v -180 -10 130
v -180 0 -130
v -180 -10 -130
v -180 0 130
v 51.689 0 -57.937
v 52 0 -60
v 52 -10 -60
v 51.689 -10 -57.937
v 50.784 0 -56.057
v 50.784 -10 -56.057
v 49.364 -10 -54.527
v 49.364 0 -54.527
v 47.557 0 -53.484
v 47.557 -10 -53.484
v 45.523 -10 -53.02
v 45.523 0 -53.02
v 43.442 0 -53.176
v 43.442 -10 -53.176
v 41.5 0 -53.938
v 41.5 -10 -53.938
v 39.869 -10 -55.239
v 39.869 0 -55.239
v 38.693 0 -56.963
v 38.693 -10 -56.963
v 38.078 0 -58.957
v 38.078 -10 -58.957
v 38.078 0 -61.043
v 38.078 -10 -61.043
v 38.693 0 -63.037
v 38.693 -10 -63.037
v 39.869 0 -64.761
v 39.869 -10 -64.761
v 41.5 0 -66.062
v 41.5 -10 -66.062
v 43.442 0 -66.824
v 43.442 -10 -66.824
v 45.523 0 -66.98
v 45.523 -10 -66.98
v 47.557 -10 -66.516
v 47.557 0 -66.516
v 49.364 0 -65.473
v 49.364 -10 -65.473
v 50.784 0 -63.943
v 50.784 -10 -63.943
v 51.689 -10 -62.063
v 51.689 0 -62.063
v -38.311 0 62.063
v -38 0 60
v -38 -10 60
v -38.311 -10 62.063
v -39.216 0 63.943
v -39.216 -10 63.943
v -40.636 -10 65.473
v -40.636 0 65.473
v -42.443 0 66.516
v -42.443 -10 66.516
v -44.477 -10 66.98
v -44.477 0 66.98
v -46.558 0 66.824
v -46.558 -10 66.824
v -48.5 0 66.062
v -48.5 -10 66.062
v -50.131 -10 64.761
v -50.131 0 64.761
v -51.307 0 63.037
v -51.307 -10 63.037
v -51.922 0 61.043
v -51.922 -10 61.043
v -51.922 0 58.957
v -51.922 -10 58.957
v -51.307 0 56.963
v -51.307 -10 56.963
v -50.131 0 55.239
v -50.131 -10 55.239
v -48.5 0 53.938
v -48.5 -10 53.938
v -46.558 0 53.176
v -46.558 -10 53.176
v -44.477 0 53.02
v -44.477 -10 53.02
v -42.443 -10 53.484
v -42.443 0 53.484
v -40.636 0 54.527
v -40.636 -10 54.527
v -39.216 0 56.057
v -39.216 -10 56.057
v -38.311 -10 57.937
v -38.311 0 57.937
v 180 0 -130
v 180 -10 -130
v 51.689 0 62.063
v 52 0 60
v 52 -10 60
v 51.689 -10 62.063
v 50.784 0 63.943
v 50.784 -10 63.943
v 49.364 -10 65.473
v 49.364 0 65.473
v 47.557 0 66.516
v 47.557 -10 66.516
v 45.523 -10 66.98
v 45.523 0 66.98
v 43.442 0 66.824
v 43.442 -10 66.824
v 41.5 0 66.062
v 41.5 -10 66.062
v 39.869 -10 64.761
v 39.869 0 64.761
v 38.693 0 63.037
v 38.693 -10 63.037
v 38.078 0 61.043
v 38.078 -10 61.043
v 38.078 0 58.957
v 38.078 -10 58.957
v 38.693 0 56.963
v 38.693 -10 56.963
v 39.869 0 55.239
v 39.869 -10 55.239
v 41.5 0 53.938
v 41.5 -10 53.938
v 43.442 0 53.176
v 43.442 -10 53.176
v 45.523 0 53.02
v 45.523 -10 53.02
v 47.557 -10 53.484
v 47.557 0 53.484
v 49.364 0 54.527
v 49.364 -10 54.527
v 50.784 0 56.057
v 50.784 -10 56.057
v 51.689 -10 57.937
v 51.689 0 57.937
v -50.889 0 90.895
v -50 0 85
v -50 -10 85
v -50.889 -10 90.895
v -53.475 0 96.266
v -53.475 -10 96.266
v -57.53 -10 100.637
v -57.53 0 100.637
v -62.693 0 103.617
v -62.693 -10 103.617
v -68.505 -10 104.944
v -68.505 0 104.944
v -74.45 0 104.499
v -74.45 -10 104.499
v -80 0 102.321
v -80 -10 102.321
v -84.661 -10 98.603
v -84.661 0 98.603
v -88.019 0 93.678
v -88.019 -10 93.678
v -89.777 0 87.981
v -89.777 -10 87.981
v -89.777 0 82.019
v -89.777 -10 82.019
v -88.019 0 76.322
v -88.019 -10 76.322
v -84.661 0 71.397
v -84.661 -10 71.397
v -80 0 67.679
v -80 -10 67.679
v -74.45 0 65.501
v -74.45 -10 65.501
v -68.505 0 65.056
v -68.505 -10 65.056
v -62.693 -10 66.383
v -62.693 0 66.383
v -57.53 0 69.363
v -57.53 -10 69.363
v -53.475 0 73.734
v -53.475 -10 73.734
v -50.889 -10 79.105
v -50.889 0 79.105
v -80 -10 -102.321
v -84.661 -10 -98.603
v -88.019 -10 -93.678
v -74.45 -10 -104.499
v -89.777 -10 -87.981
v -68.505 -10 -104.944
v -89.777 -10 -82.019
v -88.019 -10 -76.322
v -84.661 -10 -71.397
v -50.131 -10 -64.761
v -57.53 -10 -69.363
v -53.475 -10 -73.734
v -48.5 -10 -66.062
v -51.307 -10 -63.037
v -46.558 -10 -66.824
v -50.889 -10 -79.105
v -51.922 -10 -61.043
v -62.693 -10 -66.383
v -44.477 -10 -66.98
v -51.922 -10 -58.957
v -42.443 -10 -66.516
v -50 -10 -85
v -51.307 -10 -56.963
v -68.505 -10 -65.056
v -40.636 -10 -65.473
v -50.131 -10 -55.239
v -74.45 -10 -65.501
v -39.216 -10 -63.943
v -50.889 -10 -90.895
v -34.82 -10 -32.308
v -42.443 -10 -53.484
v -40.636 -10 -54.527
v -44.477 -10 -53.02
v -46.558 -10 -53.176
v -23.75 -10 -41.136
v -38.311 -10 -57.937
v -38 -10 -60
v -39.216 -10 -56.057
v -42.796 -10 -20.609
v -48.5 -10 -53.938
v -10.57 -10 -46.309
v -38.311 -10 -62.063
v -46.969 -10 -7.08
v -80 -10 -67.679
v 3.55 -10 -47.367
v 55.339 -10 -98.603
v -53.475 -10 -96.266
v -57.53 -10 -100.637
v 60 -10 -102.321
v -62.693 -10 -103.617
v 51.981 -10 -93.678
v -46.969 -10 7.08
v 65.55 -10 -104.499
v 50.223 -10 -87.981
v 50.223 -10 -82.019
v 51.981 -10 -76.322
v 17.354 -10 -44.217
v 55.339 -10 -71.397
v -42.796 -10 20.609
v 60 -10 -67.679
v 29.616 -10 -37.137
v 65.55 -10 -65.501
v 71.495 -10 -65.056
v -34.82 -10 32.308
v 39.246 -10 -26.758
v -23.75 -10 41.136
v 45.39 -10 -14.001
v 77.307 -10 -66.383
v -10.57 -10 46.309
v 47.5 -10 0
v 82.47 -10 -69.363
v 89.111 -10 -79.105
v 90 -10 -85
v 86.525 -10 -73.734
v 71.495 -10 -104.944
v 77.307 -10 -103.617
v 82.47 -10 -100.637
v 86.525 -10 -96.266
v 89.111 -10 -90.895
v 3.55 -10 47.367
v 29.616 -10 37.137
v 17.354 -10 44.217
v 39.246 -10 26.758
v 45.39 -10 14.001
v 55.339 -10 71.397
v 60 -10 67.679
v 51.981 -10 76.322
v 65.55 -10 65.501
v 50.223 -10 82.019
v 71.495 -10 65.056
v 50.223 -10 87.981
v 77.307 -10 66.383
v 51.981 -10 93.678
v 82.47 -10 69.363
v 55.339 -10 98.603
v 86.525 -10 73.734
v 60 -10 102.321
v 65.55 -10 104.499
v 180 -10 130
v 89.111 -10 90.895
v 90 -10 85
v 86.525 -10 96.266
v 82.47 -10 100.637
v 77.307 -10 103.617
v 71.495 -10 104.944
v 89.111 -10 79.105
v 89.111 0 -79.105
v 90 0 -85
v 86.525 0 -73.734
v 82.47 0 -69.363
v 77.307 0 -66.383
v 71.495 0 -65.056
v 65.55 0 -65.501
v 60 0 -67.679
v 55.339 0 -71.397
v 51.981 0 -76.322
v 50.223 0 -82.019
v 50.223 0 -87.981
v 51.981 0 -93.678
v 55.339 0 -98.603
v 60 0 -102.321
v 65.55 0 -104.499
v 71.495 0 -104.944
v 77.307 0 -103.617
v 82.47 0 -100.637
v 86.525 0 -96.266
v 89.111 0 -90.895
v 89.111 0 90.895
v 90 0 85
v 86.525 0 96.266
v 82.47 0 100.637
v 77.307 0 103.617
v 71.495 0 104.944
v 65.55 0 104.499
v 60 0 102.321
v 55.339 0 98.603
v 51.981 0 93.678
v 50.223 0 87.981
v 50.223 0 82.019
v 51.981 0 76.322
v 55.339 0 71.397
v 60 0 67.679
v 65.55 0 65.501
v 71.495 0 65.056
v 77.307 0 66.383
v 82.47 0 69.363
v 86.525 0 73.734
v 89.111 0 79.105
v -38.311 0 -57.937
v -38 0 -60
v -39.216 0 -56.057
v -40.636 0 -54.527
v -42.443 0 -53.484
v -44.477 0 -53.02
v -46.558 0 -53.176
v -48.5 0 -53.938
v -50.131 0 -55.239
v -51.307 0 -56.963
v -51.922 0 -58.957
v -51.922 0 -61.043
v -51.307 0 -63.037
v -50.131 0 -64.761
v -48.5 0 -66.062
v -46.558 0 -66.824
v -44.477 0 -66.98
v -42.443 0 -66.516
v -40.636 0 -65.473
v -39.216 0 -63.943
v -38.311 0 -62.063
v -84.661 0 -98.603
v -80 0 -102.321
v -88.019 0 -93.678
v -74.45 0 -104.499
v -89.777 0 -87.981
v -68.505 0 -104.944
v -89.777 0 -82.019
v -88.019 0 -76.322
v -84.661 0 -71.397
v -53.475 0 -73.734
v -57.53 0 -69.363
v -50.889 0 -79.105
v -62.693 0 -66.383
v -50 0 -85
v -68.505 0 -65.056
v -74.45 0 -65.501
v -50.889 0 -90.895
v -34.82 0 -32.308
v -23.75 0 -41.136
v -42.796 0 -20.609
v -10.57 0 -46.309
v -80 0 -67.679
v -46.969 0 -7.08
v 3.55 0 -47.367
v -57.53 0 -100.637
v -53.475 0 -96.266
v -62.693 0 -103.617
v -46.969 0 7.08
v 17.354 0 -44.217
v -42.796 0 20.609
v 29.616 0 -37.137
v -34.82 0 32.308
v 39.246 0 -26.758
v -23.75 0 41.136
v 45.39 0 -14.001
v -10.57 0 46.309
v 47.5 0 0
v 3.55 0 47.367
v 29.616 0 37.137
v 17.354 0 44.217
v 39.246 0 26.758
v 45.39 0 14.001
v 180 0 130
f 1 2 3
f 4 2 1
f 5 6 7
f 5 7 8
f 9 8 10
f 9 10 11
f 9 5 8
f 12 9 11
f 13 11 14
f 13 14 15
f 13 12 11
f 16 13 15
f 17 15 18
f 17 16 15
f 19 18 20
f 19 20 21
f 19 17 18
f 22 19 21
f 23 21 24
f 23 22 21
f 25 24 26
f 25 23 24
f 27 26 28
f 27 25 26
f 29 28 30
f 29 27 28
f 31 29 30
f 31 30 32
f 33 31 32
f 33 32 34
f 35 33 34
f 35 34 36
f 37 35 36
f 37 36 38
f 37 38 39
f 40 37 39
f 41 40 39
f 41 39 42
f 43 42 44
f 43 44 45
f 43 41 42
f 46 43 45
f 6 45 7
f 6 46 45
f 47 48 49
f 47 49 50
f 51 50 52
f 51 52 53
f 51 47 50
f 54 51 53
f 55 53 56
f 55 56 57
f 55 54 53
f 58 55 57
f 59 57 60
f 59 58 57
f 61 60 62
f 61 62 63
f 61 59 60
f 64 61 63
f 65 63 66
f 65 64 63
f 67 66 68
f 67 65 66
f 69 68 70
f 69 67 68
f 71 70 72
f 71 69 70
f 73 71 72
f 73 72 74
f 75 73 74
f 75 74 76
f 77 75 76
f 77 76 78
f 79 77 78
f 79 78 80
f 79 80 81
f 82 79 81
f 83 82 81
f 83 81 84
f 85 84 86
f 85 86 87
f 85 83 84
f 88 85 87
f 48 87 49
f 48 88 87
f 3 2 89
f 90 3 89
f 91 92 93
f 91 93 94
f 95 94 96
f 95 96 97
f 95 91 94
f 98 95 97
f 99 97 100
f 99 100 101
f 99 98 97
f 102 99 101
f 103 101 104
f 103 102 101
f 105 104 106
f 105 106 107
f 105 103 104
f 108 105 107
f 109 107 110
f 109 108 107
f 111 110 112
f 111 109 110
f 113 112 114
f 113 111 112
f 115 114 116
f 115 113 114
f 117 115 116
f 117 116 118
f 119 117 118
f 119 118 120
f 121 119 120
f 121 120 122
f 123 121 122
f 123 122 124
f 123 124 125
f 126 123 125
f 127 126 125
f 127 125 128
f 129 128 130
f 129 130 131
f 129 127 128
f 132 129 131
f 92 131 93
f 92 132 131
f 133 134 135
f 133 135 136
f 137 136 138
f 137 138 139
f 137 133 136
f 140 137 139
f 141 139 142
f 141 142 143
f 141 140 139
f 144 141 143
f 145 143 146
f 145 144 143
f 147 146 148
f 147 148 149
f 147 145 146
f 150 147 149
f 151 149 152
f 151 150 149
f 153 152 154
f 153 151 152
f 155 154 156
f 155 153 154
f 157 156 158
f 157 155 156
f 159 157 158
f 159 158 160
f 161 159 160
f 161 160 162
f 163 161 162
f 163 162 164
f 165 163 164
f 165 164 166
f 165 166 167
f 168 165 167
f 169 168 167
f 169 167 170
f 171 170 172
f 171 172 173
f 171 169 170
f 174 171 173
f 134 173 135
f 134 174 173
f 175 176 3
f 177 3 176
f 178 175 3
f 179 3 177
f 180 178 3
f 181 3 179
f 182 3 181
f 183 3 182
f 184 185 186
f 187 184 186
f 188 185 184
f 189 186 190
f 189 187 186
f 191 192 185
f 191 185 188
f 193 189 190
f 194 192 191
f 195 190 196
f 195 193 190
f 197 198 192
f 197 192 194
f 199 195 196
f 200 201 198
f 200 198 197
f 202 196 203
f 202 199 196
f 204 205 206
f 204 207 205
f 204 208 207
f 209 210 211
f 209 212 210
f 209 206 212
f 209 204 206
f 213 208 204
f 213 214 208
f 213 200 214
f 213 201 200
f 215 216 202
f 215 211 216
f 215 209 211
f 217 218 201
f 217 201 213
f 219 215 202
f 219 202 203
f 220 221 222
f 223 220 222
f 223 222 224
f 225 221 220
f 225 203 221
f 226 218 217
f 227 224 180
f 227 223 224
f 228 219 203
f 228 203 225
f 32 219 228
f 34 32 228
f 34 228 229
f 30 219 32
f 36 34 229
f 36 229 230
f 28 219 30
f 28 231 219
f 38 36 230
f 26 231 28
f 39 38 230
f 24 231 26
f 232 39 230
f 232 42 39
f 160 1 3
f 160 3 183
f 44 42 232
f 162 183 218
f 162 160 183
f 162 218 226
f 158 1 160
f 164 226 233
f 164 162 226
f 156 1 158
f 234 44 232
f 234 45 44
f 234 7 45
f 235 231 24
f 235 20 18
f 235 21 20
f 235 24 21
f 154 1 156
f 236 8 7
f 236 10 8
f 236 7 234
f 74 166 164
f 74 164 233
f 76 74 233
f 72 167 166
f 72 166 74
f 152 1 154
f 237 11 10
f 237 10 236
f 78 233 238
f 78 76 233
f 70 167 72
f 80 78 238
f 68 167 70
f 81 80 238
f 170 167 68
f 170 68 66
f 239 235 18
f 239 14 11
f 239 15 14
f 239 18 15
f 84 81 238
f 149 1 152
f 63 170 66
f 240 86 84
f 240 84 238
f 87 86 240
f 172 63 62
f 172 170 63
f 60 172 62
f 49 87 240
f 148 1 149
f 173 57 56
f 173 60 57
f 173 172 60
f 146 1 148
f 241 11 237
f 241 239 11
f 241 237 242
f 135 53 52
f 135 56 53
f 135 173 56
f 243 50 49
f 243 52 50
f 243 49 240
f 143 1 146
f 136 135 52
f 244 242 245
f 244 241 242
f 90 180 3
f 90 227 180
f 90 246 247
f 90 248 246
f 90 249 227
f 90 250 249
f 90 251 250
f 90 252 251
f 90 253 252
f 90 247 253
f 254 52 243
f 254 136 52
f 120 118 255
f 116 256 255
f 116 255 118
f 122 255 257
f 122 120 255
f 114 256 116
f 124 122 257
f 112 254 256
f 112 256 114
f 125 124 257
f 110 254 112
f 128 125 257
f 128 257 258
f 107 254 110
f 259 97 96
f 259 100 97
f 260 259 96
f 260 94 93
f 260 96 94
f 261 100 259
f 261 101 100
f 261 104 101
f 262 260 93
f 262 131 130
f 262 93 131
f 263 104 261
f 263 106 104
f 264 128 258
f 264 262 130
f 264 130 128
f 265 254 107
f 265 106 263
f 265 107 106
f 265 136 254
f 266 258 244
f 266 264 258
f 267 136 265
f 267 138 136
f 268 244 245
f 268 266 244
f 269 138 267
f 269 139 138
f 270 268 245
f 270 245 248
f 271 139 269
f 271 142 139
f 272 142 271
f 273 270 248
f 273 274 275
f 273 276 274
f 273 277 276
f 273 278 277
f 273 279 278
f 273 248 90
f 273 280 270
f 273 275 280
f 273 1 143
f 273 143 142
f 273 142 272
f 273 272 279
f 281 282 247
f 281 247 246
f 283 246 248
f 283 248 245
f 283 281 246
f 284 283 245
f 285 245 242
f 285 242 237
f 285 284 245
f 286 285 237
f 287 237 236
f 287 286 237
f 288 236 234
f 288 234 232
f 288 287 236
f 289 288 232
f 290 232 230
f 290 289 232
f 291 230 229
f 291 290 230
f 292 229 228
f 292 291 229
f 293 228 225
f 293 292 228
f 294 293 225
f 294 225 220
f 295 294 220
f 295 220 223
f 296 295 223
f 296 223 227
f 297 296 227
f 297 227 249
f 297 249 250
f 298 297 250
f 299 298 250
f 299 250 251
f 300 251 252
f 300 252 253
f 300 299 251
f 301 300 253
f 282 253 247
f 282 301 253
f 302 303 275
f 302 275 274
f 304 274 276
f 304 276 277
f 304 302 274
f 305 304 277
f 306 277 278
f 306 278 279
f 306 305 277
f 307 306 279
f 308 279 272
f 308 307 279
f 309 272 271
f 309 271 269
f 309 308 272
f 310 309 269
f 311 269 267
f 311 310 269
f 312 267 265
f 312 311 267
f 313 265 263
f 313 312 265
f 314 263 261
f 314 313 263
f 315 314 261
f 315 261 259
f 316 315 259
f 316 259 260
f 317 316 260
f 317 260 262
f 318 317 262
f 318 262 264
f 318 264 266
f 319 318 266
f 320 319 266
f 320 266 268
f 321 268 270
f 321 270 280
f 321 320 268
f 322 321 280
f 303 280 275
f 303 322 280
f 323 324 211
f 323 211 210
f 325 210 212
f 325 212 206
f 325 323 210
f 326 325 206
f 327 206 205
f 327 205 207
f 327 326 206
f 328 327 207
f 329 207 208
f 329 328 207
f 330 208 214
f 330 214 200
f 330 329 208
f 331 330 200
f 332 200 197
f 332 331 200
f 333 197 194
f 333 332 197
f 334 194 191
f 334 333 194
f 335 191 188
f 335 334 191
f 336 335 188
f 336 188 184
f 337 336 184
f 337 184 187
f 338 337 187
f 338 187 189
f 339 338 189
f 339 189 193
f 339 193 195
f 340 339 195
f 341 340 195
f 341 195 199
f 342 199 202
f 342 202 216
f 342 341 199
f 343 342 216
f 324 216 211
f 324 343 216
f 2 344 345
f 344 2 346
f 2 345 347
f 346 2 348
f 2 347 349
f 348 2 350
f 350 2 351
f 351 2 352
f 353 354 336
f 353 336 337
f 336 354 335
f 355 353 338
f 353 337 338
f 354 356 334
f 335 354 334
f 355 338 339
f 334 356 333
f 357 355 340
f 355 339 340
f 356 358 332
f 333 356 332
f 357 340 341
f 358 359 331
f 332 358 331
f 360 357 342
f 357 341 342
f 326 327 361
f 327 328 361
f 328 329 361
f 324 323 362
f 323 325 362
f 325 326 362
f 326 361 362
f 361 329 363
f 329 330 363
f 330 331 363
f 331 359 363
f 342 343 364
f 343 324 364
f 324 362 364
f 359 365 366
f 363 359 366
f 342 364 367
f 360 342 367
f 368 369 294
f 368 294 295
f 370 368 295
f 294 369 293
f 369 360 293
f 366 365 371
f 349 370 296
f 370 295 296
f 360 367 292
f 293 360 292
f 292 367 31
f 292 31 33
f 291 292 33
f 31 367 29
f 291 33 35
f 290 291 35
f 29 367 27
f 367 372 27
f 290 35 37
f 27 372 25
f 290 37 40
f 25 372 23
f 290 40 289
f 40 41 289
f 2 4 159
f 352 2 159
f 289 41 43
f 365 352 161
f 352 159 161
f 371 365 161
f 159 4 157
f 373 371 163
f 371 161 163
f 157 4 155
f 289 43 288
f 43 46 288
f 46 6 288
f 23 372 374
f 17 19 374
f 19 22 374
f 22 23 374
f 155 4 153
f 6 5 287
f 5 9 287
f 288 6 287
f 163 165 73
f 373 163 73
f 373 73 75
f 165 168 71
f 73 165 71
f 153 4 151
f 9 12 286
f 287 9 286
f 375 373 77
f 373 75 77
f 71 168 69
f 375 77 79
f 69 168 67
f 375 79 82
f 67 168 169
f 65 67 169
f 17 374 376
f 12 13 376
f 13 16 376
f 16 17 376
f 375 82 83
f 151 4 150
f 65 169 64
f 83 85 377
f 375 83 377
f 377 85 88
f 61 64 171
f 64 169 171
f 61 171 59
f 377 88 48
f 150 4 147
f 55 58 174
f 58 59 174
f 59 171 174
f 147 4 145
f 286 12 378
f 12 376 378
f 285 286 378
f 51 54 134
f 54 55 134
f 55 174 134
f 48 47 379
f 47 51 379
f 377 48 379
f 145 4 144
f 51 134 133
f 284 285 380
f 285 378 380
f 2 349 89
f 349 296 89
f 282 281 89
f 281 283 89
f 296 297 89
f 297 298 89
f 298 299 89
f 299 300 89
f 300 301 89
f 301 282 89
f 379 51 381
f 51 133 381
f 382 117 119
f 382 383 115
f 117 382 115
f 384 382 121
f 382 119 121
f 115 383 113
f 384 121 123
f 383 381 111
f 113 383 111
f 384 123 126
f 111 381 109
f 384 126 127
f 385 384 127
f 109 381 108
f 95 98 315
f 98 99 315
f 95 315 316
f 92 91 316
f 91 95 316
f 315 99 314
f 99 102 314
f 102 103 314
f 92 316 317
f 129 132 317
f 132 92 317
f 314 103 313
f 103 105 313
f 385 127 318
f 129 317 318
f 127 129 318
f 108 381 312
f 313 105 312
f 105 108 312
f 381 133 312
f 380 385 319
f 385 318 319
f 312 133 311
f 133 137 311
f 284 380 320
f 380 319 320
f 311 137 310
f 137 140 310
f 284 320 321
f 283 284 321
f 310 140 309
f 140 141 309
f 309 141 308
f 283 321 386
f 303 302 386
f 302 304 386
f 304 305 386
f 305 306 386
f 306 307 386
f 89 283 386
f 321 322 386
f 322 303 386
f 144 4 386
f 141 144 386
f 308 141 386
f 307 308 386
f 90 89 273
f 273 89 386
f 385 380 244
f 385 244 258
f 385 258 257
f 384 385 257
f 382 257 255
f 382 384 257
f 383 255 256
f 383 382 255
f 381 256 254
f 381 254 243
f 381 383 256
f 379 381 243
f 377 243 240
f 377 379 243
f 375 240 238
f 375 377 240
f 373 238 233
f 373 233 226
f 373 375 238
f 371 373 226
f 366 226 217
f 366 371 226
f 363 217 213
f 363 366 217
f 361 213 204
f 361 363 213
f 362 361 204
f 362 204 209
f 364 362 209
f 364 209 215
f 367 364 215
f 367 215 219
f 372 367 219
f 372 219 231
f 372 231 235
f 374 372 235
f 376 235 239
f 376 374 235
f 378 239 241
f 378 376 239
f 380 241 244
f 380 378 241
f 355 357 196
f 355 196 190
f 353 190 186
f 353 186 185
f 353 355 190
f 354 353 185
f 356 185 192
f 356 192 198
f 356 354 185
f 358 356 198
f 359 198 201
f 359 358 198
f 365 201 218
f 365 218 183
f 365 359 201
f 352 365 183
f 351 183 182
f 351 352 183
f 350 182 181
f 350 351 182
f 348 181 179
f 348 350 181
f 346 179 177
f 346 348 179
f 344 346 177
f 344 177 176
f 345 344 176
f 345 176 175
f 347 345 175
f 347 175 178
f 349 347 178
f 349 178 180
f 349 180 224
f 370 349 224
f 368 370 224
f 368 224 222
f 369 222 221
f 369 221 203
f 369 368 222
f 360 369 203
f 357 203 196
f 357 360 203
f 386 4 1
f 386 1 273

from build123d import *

# Parameters (mm, degrees)
F0_W     = 360
F0_H     = 260
F0_R     = 20
F0_R_2   = 7
F0_R_3   = 47.5
F1_DEPTH = 10


with BuildPart() as f1:
    # F0 (on Front) → F1 (new body)
    with BuildSketch(Plane.XZ):
        Rectangle(F0_W, F0_H)
        with Locations((-70, -85)):
            Circle(F0_R, mode=Mode.SUBTRACT)
        with Locations((-45, -60)):
            Circle(F0_R_2, mode=Mode.SUBTRACT)
        with Locations((70, -85)):
            Circle(F0_R, mode=Mode.SUBTRACT)
        with Locations((45, -60)):
            Circle(F0_R_2, mode=Mode.SUBTRACT)
        with Locations((-45, 60)):
            Circle(F0_R_2, mode=Mode.SUBTRACT)
        with Locations((-70, 85)):
            Circle(F0_R, mode=Mode.SUBTRACT)
        Circle(F0_R_3, mode=Mode.SUBTRACT)
        with Locations((45, 60)):
            Circle(F0_R_2, mode=Mode.SUBTRACT)
        with Locations((70, 85)):
            Circle(F0_R, mode=Mode.SUBTRACT)
    extrude(amount=F1_DEPTH)


solid = f1.part
